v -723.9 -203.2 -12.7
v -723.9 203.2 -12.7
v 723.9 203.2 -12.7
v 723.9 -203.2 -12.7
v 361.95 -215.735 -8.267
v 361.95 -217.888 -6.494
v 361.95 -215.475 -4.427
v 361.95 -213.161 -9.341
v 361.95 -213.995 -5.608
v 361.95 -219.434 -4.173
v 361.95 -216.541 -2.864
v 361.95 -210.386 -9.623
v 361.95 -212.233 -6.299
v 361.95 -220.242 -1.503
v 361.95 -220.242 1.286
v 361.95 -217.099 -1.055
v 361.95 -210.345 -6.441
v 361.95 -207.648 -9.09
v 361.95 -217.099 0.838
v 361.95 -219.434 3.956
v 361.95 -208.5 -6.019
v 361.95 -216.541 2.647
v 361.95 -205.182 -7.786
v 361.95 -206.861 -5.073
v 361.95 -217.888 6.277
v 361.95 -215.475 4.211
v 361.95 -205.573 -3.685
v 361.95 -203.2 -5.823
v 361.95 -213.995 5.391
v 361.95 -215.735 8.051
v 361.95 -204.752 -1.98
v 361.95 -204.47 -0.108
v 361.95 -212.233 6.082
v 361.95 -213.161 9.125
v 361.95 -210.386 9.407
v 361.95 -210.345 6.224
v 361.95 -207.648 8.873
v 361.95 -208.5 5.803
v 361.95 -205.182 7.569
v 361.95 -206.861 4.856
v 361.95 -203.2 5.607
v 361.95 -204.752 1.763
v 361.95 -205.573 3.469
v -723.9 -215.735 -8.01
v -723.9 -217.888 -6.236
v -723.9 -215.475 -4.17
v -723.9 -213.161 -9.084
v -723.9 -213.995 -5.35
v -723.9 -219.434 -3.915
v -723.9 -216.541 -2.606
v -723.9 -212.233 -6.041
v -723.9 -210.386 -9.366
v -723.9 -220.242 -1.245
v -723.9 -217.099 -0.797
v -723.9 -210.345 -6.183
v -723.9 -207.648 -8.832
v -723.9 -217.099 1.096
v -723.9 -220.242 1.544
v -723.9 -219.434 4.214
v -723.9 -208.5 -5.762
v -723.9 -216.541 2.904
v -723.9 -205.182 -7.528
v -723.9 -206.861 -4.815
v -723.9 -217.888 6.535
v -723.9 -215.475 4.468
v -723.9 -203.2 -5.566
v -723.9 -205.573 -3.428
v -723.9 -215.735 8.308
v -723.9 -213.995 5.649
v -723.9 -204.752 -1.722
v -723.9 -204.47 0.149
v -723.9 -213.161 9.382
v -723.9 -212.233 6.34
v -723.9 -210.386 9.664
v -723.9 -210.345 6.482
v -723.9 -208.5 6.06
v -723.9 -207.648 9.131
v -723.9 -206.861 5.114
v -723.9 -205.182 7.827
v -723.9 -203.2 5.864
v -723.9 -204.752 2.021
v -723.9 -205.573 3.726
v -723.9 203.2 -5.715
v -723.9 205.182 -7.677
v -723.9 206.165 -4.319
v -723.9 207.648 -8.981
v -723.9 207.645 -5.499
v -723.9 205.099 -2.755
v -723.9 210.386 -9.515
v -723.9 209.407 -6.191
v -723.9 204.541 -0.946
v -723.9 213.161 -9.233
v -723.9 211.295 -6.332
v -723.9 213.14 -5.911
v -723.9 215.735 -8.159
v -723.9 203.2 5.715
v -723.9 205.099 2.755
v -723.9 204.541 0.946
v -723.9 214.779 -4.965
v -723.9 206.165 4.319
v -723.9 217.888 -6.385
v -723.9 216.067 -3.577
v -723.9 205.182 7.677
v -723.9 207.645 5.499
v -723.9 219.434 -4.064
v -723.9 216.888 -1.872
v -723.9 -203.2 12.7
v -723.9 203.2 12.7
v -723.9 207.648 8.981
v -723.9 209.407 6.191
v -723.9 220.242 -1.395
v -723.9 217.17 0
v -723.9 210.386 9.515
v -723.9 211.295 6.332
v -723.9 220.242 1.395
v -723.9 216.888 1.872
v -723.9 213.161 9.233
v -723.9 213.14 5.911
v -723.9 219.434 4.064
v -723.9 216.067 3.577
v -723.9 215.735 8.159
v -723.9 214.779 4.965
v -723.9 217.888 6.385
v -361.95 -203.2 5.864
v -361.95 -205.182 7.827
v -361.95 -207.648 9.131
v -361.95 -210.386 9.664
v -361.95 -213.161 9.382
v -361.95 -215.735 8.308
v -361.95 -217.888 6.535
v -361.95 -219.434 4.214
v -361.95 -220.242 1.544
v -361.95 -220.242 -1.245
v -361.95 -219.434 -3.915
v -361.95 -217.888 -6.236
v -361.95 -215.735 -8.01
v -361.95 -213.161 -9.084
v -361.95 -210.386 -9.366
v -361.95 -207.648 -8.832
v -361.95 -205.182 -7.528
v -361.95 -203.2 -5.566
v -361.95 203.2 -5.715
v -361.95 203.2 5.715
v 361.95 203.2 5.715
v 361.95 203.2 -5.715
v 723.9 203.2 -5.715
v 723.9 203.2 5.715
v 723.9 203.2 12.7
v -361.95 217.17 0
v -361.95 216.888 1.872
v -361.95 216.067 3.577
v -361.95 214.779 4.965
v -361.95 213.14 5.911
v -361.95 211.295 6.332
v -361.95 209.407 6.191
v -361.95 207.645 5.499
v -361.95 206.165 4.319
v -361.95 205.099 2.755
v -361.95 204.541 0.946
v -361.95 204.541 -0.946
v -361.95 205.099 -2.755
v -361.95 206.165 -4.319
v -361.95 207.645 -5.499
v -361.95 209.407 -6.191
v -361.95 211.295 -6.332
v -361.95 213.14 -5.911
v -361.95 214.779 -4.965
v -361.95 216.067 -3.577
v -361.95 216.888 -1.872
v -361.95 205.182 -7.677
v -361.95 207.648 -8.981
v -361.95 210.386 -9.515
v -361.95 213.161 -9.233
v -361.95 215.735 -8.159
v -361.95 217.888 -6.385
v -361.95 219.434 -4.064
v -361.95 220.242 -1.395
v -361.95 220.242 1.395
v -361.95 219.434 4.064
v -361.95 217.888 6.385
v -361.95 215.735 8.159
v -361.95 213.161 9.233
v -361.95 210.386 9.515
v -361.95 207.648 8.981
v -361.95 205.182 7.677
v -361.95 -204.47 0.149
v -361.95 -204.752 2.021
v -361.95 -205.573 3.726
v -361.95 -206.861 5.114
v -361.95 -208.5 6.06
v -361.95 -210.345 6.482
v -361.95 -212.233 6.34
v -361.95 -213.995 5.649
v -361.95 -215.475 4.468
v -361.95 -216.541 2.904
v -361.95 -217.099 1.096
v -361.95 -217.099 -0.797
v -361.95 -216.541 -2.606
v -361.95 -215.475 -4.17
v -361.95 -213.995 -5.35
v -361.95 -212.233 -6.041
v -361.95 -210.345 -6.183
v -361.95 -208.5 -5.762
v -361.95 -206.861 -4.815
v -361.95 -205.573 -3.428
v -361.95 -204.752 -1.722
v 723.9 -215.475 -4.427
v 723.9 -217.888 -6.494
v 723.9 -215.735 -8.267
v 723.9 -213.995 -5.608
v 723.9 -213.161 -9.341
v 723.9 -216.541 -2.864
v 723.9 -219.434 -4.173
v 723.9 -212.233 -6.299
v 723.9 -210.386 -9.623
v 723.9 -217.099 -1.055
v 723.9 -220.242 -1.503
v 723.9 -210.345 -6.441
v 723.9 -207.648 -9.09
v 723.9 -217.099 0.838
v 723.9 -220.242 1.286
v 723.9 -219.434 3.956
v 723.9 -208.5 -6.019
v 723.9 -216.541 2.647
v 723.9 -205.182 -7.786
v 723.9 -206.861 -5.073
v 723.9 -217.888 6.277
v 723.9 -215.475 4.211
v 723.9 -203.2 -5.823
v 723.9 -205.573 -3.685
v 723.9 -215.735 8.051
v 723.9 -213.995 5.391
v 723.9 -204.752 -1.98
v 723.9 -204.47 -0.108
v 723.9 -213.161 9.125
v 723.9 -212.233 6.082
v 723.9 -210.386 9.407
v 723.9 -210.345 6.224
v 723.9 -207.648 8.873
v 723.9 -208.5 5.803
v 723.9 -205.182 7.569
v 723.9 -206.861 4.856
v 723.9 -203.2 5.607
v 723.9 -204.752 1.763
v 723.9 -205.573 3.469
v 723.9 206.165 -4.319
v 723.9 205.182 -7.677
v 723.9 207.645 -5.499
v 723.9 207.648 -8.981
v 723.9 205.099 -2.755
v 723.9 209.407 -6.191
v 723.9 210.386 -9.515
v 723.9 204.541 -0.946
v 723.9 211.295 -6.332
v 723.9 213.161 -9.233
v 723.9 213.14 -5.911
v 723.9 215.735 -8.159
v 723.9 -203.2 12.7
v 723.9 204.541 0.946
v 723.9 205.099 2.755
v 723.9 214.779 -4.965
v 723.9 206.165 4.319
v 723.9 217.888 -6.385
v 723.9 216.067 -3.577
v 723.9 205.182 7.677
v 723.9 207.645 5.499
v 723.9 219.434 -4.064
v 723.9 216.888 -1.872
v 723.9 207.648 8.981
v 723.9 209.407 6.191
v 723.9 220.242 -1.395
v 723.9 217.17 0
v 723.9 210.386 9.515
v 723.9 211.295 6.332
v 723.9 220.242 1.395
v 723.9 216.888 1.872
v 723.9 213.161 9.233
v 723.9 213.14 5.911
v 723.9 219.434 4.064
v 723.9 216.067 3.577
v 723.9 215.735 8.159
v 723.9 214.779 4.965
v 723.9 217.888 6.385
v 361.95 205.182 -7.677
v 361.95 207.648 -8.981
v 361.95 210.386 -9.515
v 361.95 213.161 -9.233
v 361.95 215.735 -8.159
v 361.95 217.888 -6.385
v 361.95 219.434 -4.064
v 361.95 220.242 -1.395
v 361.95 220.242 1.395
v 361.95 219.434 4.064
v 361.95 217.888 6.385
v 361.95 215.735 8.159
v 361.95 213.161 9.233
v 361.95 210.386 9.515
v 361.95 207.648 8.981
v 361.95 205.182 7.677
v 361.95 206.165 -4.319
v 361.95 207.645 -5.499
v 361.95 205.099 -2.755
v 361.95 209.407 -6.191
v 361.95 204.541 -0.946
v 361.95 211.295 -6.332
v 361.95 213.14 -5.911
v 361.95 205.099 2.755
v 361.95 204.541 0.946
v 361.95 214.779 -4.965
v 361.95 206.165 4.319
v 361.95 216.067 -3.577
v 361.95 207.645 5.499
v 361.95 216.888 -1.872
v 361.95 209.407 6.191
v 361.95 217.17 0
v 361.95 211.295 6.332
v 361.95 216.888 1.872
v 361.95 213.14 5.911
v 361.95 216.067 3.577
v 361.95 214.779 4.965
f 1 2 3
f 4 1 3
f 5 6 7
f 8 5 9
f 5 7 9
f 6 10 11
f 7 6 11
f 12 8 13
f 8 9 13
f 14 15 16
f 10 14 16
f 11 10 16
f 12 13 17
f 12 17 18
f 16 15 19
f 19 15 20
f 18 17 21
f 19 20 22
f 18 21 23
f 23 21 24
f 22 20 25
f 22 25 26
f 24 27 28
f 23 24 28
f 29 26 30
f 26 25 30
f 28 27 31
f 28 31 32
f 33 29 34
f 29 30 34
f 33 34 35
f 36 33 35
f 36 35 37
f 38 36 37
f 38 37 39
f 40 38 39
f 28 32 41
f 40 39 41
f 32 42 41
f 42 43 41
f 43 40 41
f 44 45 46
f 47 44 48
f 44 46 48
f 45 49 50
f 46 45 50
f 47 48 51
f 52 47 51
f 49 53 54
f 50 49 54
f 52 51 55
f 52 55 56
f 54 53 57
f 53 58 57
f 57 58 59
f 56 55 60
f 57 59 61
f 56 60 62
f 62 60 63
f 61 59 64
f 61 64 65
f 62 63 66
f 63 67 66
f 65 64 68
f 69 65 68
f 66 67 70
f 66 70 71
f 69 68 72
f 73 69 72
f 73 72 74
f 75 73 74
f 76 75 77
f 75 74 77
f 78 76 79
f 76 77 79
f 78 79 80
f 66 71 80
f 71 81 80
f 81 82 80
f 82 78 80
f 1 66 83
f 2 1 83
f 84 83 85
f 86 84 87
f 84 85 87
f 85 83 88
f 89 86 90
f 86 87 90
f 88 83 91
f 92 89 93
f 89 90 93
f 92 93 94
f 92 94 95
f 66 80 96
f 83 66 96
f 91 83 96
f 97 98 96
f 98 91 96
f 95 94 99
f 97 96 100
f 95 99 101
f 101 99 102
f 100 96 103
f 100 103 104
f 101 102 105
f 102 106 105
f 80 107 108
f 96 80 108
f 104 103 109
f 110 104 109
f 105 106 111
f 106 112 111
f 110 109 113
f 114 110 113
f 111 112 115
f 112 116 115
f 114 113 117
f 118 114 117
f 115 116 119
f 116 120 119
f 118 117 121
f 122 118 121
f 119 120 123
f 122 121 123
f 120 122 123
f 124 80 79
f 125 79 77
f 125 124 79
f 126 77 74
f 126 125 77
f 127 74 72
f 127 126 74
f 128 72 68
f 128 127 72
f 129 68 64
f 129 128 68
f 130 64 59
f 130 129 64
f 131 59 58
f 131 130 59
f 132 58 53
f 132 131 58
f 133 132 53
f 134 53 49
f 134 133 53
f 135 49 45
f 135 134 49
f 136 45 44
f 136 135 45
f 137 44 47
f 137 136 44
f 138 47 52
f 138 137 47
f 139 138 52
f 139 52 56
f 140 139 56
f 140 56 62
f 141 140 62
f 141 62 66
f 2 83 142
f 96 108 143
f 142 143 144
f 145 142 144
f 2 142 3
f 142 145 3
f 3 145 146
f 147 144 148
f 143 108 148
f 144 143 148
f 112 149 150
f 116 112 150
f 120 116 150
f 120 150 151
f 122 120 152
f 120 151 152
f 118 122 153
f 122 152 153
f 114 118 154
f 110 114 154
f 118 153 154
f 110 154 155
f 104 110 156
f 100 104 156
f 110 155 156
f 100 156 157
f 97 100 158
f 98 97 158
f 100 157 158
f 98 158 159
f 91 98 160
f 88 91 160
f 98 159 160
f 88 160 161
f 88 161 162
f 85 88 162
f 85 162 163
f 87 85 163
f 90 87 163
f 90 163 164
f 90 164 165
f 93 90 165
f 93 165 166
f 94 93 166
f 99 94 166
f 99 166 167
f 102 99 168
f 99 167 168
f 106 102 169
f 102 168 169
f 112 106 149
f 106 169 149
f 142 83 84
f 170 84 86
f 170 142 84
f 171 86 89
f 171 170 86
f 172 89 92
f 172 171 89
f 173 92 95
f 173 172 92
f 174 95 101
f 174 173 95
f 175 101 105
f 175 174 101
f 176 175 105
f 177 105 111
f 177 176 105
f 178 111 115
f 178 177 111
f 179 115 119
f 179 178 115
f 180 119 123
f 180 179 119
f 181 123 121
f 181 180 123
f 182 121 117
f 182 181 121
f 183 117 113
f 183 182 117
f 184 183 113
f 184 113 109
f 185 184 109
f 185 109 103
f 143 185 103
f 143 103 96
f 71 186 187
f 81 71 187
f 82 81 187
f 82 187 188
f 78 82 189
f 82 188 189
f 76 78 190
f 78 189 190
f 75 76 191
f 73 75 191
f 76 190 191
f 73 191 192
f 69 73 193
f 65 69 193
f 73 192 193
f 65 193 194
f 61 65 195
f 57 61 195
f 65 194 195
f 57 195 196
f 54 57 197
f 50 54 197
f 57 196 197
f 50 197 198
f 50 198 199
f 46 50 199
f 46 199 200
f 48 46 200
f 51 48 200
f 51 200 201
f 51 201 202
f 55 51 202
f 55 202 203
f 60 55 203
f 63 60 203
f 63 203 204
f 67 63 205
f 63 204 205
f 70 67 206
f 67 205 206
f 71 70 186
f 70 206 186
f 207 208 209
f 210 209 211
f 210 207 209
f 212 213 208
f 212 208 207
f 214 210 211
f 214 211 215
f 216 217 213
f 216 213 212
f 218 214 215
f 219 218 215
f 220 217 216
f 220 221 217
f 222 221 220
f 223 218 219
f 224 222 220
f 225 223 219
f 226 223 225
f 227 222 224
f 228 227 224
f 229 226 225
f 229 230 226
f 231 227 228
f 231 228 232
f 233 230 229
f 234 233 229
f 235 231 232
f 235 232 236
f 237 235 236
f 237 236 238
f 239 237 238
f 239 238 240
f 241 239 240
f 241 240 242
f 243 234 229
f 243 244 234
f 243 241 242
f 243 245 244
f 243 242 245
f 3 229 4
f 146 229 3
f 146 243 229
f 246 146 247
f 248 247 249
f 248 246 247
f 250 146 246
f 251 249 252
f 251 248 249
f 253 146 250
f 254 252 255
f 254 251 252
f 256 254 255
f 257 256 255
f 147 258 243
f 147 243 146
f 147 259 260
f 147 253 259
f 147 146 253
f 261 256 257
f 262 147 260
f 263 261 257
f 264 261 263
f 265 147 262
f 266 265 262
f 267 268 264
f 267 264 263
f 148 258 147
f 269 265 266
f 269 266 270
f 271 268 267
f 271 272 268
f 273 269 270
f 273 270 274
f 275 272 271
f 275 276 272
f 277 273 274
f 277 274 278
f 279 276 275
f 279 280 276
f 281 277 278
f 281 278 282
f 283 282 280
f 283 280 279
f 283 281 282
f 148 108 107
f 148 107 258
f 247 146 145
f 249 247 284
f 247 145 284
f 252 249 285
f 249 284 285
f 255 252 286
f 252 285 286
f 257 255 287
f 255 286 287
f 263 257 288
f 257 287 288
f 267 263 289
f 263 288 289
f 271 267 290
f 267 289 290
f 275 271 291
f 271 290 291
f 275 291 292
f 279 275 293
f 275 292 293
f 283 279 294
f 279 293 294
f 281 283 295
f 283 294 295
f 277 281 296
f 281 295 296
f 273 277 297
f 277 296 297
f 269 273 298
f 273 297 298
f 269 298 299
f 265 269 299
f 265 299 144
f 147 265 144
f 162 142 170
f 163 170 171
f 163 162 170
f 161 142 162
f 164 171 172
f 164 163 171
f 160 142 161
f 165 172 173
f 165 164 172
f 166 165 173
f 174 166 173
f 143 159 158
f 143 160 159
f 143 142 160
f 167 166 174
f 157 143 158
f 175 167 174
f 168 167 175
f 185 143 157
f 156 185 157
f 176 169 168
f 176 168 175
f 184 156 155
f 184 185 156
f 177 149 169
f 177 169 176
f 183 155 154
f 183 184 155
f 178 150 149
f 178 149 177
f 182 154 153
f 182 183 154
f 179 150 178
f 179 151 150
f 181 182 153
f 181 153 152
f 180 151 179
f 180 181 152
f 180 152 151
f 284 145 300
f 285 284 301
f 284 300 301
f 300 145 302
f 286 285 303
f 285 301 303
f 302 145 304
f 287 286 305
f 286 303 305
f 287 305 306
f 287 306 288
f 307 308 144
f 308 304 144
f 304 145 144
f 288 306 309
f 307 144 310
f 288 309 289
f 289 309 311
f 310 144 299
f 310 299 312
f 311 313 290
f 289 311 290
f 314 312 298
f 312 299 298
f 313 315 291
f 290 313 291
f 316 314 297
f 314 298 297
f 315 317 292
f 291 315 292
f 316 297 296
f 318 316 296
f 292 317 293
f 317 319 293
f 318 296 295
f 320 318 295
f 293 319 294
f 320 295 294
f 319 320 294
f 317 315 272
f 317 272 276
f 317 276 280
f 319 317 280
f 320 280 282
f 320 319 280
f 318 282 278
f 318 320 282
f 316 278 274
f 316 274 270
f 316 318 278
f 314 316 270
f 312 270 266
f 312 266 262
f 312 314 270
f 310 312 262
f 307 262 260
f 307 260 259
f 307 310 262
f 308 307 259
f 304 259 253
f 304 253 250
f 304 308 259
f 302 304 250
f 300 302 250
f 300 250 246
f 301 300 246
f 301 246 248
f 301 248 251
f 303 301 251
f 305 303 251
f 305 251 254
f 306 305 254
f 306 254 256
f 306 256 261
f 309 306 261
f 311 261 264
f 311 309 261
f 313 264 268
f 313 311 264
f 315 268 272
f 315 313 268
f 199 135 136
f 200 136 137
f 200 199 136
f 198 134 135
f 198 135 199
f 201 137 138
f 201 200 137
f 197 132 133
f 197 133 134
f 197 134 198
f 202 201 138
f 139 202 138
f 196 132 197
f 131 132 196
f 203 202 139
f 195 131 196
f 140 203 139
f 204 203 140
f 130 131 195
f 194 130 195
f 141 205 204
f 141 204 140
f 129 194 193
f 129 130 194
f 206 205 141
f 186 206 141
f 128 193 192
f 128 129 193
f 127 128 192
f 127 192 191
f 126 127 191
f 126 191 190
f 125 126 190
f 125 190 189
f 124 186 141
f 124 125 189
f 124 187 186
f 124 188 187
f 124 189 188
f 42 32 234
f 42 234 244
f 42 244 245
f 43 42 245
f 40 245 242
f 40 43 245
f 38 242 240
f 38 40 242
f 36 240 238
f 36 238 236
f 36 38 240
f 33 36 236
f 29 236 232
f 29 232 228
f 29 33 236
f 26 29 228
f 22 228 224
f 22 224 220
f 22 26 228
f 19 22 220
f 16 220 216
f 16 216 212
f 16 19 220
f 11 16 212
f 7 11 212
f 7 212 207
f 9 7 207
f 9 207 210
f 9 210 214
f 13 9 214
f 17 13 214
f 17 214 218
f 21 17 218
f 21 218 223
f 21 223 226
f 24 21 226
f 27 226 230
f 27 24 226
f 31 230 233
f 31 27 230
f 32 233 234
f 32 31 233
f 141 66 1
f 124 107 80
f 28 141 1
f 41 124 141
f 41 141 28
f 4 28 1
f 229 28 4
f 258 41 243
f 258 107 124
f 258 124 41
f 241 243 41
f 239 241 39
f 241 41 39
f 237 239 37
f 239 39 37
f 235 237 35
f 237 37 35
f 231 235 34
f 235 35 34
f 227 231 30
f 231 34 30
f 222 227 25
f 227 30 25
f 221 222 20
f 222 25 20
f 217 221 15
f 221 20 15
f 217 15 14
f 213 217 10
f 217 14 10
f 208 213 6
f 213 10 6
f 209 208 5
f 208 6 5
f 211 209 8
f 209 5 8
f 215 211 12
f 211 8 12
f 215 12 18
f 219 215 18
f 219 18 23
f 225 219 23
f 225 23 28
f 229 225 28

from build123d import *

# Parameters (mm, degrees)
F0_W     = 1447.8
F0_H     = 406.4
F5_DEPTH = 12.7
F4_R     = 9.525
F4_R_2   = 6.35
F6_DEPTH = 361.95
F3_R     = 9.525
F3_R_2   = 6.35
F7_DEPTH = 361.95
F8_DEPTH = 361.95
F9_DEPTH = 361.95


with BuildPart() as f5:
    # F0 (on Top) → F5 (new body, symmetric)
    with BuildSketch(Plane.XY):
        Rectangle(F0_W, F0_H)
    extrude(amount=F5_DEPTH, both=True)

    # F4 (on offset) → F6 (join)
    with BuildSketch(Plane.YZ.offset(-361.95)):
        with Locations((210.82, 0)):
            Circle(F4_R)
        with Locations((210.82, 0)):
            Circle(F4_R_2, mode=Mode.SUBTRACT)
    extrude(amount=-F6_DEPTH)

    # F3 (on offset) → F7 (join)
    with BuildSketch(Plane.YZ.offset(361.95)):
        with Locations((210.82, 0)):
            Circle(F3_R)
        with Locations((210.82, 0)):
            Circle(F3_R_2, mode=Mode.SUBTRACT)
    extrude(amount=F7_DEPTH)

    # F4 (on offset) → F8 (join)
    with BuildSketch(Plane.YZ.offset(-361.95)):
        with Locations((-210.82, 0.1492979936)):
            Circle(F4_R)
        with Locations((-210.82, 0.1492979936)):
            Circle(F4_R_2, mode=Mode.SUBTRACT)
    extrude(amount=-F8_DEPTH)

    # F3 (on offset) → F9 (join)
    with BuildSketch(Plane.YZ.offset(361.95)):
        with Locations((-210.82, -0.1084019023)):
            Circle(F3_R)
        with Locations((-210.82, -0.1084019023)):
            Circle(F3_R_2, mode=Mode.SUBTRACT)
    extrude(amount=F9_DEPTH)


solid = f5.part
